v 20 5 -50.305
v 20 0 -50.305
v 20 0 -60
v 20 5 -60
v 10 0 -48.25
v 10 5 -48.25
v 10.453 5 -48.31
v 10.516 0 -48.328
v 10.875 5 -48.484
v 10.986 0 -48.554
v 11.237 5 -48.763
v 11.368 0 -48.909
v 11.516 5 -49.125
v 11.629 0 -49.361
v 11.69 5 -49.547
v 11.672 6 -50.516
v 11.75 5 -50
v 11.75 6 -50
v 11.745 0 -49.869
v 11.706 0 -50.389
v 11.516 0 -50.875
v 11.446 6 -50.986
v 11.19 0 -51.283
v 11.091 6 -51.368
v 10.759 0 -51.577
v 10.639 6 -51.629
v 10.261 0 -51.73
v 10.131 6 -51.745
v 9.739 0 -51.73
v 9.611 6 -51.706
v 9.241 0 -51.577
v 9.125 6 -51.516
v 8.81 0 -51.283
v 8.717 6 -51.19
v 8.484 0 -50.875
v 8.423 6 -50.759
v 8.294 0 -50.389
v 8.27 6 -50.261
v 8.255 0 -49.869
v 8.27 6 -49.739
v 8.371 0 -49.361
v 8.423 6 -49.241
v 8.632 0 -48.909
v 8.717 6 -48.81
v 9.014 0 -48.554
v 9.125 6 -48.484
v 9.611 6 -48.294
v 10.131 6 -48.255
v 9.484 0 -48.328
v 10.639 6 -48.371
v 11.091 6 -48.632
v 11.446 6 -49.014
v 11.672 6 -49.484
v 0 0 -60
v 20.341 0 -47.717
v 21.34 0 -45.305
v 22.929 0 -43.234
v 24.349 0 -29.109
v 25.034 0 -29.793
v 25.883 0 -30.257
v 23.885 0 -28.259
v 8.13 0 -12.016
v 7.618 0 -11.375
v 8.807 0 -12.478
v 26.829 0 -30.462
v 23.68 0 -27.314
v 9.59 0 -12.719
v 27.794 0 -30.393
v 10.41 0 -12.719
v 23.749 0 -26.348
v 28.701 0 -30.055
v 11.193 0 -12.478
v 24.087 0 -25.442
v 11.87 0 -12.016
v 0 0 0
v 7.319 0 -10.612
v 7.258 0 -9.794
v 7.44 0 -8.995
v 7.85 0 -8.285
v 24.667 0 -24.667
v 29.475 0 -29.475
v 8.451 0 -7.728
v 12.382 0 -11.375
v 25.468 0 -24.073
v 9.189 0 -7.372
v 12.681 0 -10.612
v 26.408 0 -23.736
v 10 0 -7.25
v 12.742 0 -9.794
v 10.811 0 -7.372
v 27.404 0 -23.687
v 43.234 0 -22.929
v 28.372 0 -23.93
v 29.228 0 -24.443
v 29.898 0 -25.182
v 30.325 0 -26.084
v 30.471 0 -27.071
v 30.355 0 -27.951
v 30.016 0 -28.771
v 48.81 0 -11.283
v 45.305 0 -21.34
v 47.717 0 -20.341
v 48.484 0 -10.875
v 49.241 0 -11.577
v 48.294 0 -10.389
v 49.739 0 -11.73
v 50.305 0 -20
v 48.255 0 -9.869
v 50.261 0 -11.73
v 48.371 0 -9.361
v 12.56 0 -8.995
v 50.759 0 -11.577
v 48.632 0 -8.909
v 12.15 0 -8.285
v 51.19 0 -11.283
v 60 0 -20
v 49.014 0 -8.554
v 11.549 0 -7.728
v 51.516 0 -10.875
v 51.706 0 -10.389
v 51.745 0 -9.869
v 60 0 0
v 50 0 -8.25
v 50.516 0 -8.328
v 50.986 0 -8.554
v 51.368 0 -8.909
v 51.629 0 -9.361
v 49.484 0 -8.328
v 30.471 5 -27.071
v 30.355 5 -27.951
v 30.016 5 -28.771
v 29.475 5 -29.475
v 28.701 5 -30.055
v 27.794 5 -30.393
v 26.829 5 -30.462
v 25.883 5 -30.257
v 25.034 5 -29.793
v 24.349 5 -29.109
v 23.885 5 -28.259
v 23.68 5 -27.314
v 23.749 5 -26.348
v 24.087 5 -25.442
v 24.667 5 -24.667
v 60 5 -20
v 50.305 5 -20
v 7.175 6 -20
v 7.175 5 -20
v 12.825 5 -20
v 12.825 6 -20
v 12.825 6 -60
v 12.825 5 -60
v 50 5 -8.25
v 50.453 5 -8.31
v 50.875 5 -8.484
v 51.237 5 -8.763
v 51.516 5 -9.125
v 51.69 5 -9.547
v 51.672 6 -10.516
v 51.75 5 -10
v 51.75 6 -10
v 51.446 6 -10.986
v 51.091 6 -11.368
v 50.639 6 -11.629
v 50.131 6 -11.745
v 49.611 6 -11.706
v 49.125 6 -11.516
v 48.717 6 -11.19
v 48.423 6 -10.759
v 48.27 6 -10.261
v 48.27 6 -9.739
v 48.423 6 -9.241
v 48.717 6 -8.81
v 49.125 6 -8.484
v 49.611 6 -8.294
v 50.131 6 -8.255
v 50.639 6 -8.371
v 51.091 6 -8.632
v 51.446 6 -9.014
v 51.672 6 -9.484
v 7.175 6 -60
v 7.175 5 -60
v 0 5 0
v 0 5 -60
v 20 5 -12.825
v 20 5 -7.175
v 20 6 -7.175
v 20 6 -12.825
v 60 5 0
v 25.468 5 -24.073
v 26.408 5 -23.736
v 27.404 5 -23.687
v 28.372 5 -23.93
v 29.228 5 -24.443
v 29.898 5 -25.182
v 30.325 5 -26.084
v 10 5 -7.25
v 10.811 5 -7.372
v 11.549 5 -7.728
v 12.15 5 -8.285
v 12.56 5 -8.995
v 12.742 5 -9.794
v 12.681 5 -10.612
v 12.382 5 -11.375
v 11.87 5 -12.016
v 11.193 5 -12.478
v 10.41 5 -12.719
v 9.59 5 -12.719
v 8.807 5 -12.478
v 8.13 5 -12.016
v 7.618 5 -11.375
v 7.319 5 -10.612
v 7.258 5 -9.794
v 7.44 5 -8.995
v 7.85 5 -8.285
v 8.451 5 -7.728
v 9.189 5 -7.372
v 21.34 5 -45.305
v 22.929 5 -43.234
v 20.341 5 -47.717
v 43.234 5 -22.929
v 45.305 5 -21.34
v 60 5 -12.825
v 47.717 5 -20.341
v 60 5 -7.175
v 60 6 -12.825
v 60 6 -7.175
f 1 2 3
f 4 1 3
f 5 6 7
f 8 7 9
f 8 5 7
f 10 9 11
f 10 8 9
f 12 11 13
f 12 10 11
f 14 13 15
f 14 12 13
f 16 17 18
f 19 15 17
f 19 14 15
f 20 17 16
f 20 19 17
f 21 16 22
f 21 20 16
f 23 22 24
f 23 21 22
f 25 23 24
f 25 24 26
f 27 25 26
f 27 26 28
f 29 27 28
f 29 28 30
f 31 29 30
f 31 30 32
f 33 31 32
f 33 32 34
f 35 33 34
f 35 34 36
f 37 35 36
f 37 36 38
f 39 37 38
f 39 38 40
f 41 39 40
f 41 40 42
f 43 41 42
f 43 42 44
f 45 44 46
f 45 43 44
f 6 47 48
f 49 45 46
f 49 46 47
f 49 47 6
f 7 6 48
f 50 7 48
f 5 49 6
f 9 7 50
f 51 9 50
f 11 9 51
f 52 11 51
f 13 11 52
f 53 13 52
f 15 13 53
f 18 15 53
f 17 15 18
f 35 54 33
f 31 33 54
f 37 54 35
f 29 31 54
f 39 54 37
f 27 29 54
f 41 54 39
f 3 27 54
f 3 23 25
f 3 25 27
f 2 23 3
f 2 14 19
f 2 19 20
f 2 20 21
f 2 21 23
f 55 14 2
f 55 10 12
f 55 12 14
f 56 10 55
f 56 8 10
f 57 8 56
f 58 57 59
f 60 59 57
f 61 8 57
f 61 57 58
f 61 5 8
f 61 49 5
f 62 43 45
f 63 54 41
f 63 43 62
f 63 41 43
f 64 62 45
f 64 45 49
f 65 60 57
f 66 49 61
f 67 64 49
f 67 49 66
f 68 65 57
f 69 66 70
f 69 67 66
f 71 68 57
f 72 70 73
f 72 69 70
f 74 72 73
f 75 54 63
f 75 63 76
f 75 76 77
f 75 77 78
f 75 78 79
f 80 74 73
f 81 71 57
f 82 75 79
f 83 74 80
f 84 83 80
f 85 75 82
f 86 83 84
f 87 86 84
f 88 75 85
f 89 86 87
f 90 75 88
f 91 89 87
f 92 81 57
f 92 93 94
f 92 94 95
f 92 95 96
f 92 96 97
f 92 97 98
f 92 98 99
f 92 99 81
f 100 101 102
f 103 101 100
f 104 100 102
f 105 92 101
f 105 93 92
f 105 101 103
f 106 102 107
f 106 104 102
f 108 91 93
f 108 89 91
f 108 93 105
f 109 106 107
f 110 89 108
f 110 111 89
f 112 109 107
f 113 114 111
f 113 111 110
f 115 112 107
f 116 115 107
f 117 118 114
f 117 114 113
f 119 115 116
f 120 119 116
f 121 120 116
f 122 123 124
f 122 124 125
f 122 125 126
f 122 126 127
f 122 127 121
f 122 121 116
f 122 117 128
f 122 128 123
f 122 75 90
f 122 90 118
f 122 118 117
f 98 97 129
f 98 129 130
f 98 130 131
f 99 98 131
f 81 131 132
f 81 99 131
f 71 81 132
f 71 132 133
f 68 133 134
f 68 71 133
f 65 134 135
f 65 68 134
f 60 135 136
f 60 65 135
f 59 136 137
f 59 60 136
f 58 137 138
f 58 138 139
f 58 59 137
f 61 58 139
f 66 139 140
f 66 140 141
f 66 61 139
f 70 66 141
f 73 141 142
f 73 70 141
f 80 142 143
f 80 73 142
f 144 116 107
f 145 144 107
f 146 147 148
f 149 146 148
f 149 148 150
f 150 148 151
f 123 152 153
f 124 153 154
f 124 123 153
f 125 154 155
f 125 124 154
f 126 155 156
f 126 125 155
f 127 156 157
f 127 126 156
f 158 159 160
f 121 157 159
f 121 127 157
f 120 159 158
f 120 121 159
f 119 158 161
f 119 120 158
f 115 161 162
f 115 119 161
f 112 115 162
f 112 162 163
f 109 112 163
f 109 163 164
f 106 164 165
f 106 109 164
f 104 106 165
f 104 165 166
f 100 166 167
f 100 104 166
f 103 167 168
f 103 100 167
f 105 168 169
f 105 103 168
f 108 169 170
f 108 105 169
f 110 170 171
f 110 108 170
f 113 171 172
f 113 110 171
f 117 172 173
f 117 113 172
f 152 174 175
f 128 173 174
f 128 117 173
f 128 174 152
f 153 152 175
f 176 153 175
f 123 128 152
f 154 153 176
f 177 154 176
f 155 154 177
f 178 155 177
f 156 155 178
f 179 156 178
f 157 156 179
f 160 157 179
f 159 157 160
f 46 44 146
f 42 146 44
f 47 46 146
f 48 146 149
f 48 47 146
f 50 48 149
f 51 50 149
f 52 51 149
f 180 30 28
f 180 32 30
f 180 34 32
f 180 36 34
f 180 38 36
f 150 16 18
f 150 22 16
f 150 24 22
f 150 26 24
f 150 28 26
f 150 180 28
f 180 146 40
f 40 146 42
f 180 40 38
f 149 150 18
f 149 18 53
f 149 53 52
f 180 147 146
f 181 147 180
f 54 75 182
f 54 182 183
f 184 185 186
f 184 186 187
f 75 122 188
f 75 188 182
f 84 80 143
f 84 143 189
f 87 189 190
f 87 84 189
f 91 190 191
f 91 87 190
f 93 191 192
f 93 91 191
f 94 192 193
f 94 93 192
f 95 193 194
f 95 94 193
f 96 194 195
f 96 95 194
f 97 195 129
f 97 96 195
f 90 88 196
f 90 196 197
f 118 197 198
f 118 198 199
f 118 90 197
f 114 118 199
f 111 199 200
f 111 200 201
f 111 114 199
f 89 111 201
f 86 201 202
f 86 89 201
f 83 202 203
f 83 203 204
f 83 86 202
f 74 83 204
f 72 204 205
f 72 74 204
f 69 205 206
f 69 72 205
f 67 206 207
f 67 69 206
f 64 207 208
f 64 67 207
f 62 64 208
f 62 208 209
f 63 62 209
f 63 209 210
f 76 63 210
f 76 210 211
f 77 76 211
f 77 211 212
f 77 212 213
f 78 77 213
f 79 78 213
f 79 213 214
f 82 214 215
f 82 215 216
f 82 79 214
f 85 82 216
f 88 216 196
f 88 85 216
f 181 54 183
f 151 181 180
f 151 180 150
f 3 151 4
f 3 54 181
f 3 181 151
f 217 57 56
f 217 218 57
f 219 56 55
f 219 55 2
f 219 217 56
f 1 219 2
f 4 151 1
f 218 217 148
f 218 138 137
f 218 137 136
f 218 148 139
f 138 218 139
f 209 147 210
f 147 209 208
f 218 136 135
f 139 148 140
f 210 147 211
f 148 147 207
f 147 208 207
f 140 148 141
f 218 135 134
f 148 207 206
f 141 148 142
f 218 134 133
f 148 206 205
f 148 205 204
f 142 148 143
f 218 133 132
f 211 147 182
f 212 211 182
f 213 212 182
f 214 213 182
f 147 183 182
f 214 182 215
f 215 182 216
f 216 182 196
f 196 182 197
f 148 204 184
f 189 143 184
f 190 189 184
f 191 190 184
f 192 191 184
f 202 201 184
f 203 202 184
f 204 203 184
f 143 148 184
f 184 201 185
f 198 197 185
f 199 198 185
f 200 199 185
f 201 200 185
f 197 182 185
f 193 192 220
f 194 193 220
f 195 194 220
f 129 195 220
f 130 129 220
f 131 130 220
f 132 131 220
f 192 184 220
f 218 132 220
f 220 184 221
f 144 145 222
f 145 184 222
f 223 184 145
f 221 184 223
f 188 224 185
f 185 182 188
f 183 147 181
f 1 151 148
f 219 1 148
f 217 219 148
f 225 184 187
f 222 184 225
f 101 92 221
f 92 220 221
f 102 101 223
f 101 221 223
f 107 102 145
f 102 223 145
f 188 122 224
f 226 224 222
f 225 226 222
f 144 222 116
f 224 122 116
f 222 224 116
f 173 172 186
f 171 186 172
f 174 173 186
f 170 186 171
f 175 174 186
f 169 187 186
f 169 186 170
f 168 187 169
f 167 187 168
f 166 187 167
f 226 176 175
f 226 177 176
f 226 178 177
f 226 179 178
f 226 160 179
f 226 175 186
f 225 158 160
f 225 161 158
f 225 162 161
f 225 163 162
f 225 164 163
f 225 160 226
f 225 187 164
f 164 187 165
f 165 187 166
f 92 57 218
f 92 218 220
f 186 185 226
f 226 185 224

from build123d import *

# Parameters (mm, degrees)
ESBO_O1_R                = 2.75
ESBO_O1_R_2              = 1.75
RESSALTO_EXTRUS_O1_DEPTH = 5
ESBO_O2_W                = 40
ESBO_O2_H                = 5.65
ESBO_O2_R                = 1.75
ESBO_O2_W_2              = 5.65
ESBO_O2_H_2              = 40
RESSALTO_EXTRUS_O2_DEPTH = 1
RESSALTO_EXTRUS_O3_DEPTH = 5
FILETE1_R                = 10


with BuildPart() as part:
    # Esboço1 → Ressalto-extrusão1 (new body)
    with BuildSketch(Plane(origin=(0, 0, 0), x_dir=(1, 0, 0), z_dir=(0, 1, 0))):
        Polygon((52.928932188, 20), (60, 20), (60, 0), (0, 0), (0, 60), (20, 60), (20, 52.928932188), (20, 20), align=None)
        with Locations(Location((10, 10, 0), (0, 0, 270))):
            Circle(ESBO_O1_R, mode=Mode.SUBTRACT)
        with Locations(Location((50, 10, 0), (0, 0, 270))):
            Circle(ESBO_O1_R_2, mode=Mode.SUBTRACT)
        with Locations(Location((10, 50, 0), (0, 0, 270))):
            Circle(ESBO_O1_R_2, mode=Mode.SUBTRACT)
    extrude(amount=RESSALTO_EXTRUS_O1_DEPTH)

    # Esboço2 → Ressalto-extrusão2 (add)
    # profile 1 of 2: a face of its own
    with BuildSketch(Plane(origin=(0, 5, 0), x_dir=(1, 0, 0), z_dir=(0, 1, 0))):
        with Locations((40, 10)):
            Rectangle(ESBO_O2_W, ESBO_O2_H)
        with Locations((50, 10)):
            Circle(ESBO_O2_R, mode=Mode.SUBTRACT)
    # profile 2 of 2: a face of its own
    with BuildSketch(Plane(origin=(0, 5, 0), x_dir=(1, 0, 0), z_dir=(0, 1, 0))):
        with Locations((10, 40)):
            Rectangle(ESBO_O2_W_2, ESBO_O2_H_2)
        with Locations((10, 50)):
            Circle(ESBO_O2_R, mode=Mode.SUBTRACT)
    extrude(amount=RESSALTO_EXTRUS_O2_DEPTH)

    # Esboço3 → Ressalto-extrusão3 (add)
    with BuildSketch(Plane.XZ):
        with BuildLine():
            Line((24.666904756, -24.666904756), (20, -20))
            Line((20, -20), (20, -46.162950904))
            Line((20, -46.162950904), (33.081475452, -33.081475452))
            Line((33.081475452, -33.081475452), (29.475230868, -29.475230868))
            ThreePointArc((29.475230868, -29.475230868), (24.666904756, -29.475230868), (24.666904756, -24.666904756))
        make_face()
        with BuildLine():
            Line((46.162950904, -20), (20, -20))
            Line((20, -20), (24.666904756, -24.666904756))
            ThreePointArc((24.666904756, -24.666904756), (28.372191482, -23.929877401), (30.471067812, -27.071067812))
            ThreePointArc((30.471067812, -27.071067812), (30.212258222, -28.372191482), (29.475230868, -29.475230868))
            Line((29.475230868, -29.475230868), (33.081475452, -33.081475452))
            Line((33.081475452, -33.081475452), (46.162950904, -20))
        make_face()
    extrude(amount=-RESSALTO_EXTRUS_O3_DEPTH)

    # Filete1
    filete1_edges = [part.edges().sort_by_distance(p)[0] for p in [
        (46.162950904, 2.5, -20),
        (20, 2.5, -46.162950904),
    ]]
    fillet(filete1_edges, radius=FILETE1_R)


solid = part.part
